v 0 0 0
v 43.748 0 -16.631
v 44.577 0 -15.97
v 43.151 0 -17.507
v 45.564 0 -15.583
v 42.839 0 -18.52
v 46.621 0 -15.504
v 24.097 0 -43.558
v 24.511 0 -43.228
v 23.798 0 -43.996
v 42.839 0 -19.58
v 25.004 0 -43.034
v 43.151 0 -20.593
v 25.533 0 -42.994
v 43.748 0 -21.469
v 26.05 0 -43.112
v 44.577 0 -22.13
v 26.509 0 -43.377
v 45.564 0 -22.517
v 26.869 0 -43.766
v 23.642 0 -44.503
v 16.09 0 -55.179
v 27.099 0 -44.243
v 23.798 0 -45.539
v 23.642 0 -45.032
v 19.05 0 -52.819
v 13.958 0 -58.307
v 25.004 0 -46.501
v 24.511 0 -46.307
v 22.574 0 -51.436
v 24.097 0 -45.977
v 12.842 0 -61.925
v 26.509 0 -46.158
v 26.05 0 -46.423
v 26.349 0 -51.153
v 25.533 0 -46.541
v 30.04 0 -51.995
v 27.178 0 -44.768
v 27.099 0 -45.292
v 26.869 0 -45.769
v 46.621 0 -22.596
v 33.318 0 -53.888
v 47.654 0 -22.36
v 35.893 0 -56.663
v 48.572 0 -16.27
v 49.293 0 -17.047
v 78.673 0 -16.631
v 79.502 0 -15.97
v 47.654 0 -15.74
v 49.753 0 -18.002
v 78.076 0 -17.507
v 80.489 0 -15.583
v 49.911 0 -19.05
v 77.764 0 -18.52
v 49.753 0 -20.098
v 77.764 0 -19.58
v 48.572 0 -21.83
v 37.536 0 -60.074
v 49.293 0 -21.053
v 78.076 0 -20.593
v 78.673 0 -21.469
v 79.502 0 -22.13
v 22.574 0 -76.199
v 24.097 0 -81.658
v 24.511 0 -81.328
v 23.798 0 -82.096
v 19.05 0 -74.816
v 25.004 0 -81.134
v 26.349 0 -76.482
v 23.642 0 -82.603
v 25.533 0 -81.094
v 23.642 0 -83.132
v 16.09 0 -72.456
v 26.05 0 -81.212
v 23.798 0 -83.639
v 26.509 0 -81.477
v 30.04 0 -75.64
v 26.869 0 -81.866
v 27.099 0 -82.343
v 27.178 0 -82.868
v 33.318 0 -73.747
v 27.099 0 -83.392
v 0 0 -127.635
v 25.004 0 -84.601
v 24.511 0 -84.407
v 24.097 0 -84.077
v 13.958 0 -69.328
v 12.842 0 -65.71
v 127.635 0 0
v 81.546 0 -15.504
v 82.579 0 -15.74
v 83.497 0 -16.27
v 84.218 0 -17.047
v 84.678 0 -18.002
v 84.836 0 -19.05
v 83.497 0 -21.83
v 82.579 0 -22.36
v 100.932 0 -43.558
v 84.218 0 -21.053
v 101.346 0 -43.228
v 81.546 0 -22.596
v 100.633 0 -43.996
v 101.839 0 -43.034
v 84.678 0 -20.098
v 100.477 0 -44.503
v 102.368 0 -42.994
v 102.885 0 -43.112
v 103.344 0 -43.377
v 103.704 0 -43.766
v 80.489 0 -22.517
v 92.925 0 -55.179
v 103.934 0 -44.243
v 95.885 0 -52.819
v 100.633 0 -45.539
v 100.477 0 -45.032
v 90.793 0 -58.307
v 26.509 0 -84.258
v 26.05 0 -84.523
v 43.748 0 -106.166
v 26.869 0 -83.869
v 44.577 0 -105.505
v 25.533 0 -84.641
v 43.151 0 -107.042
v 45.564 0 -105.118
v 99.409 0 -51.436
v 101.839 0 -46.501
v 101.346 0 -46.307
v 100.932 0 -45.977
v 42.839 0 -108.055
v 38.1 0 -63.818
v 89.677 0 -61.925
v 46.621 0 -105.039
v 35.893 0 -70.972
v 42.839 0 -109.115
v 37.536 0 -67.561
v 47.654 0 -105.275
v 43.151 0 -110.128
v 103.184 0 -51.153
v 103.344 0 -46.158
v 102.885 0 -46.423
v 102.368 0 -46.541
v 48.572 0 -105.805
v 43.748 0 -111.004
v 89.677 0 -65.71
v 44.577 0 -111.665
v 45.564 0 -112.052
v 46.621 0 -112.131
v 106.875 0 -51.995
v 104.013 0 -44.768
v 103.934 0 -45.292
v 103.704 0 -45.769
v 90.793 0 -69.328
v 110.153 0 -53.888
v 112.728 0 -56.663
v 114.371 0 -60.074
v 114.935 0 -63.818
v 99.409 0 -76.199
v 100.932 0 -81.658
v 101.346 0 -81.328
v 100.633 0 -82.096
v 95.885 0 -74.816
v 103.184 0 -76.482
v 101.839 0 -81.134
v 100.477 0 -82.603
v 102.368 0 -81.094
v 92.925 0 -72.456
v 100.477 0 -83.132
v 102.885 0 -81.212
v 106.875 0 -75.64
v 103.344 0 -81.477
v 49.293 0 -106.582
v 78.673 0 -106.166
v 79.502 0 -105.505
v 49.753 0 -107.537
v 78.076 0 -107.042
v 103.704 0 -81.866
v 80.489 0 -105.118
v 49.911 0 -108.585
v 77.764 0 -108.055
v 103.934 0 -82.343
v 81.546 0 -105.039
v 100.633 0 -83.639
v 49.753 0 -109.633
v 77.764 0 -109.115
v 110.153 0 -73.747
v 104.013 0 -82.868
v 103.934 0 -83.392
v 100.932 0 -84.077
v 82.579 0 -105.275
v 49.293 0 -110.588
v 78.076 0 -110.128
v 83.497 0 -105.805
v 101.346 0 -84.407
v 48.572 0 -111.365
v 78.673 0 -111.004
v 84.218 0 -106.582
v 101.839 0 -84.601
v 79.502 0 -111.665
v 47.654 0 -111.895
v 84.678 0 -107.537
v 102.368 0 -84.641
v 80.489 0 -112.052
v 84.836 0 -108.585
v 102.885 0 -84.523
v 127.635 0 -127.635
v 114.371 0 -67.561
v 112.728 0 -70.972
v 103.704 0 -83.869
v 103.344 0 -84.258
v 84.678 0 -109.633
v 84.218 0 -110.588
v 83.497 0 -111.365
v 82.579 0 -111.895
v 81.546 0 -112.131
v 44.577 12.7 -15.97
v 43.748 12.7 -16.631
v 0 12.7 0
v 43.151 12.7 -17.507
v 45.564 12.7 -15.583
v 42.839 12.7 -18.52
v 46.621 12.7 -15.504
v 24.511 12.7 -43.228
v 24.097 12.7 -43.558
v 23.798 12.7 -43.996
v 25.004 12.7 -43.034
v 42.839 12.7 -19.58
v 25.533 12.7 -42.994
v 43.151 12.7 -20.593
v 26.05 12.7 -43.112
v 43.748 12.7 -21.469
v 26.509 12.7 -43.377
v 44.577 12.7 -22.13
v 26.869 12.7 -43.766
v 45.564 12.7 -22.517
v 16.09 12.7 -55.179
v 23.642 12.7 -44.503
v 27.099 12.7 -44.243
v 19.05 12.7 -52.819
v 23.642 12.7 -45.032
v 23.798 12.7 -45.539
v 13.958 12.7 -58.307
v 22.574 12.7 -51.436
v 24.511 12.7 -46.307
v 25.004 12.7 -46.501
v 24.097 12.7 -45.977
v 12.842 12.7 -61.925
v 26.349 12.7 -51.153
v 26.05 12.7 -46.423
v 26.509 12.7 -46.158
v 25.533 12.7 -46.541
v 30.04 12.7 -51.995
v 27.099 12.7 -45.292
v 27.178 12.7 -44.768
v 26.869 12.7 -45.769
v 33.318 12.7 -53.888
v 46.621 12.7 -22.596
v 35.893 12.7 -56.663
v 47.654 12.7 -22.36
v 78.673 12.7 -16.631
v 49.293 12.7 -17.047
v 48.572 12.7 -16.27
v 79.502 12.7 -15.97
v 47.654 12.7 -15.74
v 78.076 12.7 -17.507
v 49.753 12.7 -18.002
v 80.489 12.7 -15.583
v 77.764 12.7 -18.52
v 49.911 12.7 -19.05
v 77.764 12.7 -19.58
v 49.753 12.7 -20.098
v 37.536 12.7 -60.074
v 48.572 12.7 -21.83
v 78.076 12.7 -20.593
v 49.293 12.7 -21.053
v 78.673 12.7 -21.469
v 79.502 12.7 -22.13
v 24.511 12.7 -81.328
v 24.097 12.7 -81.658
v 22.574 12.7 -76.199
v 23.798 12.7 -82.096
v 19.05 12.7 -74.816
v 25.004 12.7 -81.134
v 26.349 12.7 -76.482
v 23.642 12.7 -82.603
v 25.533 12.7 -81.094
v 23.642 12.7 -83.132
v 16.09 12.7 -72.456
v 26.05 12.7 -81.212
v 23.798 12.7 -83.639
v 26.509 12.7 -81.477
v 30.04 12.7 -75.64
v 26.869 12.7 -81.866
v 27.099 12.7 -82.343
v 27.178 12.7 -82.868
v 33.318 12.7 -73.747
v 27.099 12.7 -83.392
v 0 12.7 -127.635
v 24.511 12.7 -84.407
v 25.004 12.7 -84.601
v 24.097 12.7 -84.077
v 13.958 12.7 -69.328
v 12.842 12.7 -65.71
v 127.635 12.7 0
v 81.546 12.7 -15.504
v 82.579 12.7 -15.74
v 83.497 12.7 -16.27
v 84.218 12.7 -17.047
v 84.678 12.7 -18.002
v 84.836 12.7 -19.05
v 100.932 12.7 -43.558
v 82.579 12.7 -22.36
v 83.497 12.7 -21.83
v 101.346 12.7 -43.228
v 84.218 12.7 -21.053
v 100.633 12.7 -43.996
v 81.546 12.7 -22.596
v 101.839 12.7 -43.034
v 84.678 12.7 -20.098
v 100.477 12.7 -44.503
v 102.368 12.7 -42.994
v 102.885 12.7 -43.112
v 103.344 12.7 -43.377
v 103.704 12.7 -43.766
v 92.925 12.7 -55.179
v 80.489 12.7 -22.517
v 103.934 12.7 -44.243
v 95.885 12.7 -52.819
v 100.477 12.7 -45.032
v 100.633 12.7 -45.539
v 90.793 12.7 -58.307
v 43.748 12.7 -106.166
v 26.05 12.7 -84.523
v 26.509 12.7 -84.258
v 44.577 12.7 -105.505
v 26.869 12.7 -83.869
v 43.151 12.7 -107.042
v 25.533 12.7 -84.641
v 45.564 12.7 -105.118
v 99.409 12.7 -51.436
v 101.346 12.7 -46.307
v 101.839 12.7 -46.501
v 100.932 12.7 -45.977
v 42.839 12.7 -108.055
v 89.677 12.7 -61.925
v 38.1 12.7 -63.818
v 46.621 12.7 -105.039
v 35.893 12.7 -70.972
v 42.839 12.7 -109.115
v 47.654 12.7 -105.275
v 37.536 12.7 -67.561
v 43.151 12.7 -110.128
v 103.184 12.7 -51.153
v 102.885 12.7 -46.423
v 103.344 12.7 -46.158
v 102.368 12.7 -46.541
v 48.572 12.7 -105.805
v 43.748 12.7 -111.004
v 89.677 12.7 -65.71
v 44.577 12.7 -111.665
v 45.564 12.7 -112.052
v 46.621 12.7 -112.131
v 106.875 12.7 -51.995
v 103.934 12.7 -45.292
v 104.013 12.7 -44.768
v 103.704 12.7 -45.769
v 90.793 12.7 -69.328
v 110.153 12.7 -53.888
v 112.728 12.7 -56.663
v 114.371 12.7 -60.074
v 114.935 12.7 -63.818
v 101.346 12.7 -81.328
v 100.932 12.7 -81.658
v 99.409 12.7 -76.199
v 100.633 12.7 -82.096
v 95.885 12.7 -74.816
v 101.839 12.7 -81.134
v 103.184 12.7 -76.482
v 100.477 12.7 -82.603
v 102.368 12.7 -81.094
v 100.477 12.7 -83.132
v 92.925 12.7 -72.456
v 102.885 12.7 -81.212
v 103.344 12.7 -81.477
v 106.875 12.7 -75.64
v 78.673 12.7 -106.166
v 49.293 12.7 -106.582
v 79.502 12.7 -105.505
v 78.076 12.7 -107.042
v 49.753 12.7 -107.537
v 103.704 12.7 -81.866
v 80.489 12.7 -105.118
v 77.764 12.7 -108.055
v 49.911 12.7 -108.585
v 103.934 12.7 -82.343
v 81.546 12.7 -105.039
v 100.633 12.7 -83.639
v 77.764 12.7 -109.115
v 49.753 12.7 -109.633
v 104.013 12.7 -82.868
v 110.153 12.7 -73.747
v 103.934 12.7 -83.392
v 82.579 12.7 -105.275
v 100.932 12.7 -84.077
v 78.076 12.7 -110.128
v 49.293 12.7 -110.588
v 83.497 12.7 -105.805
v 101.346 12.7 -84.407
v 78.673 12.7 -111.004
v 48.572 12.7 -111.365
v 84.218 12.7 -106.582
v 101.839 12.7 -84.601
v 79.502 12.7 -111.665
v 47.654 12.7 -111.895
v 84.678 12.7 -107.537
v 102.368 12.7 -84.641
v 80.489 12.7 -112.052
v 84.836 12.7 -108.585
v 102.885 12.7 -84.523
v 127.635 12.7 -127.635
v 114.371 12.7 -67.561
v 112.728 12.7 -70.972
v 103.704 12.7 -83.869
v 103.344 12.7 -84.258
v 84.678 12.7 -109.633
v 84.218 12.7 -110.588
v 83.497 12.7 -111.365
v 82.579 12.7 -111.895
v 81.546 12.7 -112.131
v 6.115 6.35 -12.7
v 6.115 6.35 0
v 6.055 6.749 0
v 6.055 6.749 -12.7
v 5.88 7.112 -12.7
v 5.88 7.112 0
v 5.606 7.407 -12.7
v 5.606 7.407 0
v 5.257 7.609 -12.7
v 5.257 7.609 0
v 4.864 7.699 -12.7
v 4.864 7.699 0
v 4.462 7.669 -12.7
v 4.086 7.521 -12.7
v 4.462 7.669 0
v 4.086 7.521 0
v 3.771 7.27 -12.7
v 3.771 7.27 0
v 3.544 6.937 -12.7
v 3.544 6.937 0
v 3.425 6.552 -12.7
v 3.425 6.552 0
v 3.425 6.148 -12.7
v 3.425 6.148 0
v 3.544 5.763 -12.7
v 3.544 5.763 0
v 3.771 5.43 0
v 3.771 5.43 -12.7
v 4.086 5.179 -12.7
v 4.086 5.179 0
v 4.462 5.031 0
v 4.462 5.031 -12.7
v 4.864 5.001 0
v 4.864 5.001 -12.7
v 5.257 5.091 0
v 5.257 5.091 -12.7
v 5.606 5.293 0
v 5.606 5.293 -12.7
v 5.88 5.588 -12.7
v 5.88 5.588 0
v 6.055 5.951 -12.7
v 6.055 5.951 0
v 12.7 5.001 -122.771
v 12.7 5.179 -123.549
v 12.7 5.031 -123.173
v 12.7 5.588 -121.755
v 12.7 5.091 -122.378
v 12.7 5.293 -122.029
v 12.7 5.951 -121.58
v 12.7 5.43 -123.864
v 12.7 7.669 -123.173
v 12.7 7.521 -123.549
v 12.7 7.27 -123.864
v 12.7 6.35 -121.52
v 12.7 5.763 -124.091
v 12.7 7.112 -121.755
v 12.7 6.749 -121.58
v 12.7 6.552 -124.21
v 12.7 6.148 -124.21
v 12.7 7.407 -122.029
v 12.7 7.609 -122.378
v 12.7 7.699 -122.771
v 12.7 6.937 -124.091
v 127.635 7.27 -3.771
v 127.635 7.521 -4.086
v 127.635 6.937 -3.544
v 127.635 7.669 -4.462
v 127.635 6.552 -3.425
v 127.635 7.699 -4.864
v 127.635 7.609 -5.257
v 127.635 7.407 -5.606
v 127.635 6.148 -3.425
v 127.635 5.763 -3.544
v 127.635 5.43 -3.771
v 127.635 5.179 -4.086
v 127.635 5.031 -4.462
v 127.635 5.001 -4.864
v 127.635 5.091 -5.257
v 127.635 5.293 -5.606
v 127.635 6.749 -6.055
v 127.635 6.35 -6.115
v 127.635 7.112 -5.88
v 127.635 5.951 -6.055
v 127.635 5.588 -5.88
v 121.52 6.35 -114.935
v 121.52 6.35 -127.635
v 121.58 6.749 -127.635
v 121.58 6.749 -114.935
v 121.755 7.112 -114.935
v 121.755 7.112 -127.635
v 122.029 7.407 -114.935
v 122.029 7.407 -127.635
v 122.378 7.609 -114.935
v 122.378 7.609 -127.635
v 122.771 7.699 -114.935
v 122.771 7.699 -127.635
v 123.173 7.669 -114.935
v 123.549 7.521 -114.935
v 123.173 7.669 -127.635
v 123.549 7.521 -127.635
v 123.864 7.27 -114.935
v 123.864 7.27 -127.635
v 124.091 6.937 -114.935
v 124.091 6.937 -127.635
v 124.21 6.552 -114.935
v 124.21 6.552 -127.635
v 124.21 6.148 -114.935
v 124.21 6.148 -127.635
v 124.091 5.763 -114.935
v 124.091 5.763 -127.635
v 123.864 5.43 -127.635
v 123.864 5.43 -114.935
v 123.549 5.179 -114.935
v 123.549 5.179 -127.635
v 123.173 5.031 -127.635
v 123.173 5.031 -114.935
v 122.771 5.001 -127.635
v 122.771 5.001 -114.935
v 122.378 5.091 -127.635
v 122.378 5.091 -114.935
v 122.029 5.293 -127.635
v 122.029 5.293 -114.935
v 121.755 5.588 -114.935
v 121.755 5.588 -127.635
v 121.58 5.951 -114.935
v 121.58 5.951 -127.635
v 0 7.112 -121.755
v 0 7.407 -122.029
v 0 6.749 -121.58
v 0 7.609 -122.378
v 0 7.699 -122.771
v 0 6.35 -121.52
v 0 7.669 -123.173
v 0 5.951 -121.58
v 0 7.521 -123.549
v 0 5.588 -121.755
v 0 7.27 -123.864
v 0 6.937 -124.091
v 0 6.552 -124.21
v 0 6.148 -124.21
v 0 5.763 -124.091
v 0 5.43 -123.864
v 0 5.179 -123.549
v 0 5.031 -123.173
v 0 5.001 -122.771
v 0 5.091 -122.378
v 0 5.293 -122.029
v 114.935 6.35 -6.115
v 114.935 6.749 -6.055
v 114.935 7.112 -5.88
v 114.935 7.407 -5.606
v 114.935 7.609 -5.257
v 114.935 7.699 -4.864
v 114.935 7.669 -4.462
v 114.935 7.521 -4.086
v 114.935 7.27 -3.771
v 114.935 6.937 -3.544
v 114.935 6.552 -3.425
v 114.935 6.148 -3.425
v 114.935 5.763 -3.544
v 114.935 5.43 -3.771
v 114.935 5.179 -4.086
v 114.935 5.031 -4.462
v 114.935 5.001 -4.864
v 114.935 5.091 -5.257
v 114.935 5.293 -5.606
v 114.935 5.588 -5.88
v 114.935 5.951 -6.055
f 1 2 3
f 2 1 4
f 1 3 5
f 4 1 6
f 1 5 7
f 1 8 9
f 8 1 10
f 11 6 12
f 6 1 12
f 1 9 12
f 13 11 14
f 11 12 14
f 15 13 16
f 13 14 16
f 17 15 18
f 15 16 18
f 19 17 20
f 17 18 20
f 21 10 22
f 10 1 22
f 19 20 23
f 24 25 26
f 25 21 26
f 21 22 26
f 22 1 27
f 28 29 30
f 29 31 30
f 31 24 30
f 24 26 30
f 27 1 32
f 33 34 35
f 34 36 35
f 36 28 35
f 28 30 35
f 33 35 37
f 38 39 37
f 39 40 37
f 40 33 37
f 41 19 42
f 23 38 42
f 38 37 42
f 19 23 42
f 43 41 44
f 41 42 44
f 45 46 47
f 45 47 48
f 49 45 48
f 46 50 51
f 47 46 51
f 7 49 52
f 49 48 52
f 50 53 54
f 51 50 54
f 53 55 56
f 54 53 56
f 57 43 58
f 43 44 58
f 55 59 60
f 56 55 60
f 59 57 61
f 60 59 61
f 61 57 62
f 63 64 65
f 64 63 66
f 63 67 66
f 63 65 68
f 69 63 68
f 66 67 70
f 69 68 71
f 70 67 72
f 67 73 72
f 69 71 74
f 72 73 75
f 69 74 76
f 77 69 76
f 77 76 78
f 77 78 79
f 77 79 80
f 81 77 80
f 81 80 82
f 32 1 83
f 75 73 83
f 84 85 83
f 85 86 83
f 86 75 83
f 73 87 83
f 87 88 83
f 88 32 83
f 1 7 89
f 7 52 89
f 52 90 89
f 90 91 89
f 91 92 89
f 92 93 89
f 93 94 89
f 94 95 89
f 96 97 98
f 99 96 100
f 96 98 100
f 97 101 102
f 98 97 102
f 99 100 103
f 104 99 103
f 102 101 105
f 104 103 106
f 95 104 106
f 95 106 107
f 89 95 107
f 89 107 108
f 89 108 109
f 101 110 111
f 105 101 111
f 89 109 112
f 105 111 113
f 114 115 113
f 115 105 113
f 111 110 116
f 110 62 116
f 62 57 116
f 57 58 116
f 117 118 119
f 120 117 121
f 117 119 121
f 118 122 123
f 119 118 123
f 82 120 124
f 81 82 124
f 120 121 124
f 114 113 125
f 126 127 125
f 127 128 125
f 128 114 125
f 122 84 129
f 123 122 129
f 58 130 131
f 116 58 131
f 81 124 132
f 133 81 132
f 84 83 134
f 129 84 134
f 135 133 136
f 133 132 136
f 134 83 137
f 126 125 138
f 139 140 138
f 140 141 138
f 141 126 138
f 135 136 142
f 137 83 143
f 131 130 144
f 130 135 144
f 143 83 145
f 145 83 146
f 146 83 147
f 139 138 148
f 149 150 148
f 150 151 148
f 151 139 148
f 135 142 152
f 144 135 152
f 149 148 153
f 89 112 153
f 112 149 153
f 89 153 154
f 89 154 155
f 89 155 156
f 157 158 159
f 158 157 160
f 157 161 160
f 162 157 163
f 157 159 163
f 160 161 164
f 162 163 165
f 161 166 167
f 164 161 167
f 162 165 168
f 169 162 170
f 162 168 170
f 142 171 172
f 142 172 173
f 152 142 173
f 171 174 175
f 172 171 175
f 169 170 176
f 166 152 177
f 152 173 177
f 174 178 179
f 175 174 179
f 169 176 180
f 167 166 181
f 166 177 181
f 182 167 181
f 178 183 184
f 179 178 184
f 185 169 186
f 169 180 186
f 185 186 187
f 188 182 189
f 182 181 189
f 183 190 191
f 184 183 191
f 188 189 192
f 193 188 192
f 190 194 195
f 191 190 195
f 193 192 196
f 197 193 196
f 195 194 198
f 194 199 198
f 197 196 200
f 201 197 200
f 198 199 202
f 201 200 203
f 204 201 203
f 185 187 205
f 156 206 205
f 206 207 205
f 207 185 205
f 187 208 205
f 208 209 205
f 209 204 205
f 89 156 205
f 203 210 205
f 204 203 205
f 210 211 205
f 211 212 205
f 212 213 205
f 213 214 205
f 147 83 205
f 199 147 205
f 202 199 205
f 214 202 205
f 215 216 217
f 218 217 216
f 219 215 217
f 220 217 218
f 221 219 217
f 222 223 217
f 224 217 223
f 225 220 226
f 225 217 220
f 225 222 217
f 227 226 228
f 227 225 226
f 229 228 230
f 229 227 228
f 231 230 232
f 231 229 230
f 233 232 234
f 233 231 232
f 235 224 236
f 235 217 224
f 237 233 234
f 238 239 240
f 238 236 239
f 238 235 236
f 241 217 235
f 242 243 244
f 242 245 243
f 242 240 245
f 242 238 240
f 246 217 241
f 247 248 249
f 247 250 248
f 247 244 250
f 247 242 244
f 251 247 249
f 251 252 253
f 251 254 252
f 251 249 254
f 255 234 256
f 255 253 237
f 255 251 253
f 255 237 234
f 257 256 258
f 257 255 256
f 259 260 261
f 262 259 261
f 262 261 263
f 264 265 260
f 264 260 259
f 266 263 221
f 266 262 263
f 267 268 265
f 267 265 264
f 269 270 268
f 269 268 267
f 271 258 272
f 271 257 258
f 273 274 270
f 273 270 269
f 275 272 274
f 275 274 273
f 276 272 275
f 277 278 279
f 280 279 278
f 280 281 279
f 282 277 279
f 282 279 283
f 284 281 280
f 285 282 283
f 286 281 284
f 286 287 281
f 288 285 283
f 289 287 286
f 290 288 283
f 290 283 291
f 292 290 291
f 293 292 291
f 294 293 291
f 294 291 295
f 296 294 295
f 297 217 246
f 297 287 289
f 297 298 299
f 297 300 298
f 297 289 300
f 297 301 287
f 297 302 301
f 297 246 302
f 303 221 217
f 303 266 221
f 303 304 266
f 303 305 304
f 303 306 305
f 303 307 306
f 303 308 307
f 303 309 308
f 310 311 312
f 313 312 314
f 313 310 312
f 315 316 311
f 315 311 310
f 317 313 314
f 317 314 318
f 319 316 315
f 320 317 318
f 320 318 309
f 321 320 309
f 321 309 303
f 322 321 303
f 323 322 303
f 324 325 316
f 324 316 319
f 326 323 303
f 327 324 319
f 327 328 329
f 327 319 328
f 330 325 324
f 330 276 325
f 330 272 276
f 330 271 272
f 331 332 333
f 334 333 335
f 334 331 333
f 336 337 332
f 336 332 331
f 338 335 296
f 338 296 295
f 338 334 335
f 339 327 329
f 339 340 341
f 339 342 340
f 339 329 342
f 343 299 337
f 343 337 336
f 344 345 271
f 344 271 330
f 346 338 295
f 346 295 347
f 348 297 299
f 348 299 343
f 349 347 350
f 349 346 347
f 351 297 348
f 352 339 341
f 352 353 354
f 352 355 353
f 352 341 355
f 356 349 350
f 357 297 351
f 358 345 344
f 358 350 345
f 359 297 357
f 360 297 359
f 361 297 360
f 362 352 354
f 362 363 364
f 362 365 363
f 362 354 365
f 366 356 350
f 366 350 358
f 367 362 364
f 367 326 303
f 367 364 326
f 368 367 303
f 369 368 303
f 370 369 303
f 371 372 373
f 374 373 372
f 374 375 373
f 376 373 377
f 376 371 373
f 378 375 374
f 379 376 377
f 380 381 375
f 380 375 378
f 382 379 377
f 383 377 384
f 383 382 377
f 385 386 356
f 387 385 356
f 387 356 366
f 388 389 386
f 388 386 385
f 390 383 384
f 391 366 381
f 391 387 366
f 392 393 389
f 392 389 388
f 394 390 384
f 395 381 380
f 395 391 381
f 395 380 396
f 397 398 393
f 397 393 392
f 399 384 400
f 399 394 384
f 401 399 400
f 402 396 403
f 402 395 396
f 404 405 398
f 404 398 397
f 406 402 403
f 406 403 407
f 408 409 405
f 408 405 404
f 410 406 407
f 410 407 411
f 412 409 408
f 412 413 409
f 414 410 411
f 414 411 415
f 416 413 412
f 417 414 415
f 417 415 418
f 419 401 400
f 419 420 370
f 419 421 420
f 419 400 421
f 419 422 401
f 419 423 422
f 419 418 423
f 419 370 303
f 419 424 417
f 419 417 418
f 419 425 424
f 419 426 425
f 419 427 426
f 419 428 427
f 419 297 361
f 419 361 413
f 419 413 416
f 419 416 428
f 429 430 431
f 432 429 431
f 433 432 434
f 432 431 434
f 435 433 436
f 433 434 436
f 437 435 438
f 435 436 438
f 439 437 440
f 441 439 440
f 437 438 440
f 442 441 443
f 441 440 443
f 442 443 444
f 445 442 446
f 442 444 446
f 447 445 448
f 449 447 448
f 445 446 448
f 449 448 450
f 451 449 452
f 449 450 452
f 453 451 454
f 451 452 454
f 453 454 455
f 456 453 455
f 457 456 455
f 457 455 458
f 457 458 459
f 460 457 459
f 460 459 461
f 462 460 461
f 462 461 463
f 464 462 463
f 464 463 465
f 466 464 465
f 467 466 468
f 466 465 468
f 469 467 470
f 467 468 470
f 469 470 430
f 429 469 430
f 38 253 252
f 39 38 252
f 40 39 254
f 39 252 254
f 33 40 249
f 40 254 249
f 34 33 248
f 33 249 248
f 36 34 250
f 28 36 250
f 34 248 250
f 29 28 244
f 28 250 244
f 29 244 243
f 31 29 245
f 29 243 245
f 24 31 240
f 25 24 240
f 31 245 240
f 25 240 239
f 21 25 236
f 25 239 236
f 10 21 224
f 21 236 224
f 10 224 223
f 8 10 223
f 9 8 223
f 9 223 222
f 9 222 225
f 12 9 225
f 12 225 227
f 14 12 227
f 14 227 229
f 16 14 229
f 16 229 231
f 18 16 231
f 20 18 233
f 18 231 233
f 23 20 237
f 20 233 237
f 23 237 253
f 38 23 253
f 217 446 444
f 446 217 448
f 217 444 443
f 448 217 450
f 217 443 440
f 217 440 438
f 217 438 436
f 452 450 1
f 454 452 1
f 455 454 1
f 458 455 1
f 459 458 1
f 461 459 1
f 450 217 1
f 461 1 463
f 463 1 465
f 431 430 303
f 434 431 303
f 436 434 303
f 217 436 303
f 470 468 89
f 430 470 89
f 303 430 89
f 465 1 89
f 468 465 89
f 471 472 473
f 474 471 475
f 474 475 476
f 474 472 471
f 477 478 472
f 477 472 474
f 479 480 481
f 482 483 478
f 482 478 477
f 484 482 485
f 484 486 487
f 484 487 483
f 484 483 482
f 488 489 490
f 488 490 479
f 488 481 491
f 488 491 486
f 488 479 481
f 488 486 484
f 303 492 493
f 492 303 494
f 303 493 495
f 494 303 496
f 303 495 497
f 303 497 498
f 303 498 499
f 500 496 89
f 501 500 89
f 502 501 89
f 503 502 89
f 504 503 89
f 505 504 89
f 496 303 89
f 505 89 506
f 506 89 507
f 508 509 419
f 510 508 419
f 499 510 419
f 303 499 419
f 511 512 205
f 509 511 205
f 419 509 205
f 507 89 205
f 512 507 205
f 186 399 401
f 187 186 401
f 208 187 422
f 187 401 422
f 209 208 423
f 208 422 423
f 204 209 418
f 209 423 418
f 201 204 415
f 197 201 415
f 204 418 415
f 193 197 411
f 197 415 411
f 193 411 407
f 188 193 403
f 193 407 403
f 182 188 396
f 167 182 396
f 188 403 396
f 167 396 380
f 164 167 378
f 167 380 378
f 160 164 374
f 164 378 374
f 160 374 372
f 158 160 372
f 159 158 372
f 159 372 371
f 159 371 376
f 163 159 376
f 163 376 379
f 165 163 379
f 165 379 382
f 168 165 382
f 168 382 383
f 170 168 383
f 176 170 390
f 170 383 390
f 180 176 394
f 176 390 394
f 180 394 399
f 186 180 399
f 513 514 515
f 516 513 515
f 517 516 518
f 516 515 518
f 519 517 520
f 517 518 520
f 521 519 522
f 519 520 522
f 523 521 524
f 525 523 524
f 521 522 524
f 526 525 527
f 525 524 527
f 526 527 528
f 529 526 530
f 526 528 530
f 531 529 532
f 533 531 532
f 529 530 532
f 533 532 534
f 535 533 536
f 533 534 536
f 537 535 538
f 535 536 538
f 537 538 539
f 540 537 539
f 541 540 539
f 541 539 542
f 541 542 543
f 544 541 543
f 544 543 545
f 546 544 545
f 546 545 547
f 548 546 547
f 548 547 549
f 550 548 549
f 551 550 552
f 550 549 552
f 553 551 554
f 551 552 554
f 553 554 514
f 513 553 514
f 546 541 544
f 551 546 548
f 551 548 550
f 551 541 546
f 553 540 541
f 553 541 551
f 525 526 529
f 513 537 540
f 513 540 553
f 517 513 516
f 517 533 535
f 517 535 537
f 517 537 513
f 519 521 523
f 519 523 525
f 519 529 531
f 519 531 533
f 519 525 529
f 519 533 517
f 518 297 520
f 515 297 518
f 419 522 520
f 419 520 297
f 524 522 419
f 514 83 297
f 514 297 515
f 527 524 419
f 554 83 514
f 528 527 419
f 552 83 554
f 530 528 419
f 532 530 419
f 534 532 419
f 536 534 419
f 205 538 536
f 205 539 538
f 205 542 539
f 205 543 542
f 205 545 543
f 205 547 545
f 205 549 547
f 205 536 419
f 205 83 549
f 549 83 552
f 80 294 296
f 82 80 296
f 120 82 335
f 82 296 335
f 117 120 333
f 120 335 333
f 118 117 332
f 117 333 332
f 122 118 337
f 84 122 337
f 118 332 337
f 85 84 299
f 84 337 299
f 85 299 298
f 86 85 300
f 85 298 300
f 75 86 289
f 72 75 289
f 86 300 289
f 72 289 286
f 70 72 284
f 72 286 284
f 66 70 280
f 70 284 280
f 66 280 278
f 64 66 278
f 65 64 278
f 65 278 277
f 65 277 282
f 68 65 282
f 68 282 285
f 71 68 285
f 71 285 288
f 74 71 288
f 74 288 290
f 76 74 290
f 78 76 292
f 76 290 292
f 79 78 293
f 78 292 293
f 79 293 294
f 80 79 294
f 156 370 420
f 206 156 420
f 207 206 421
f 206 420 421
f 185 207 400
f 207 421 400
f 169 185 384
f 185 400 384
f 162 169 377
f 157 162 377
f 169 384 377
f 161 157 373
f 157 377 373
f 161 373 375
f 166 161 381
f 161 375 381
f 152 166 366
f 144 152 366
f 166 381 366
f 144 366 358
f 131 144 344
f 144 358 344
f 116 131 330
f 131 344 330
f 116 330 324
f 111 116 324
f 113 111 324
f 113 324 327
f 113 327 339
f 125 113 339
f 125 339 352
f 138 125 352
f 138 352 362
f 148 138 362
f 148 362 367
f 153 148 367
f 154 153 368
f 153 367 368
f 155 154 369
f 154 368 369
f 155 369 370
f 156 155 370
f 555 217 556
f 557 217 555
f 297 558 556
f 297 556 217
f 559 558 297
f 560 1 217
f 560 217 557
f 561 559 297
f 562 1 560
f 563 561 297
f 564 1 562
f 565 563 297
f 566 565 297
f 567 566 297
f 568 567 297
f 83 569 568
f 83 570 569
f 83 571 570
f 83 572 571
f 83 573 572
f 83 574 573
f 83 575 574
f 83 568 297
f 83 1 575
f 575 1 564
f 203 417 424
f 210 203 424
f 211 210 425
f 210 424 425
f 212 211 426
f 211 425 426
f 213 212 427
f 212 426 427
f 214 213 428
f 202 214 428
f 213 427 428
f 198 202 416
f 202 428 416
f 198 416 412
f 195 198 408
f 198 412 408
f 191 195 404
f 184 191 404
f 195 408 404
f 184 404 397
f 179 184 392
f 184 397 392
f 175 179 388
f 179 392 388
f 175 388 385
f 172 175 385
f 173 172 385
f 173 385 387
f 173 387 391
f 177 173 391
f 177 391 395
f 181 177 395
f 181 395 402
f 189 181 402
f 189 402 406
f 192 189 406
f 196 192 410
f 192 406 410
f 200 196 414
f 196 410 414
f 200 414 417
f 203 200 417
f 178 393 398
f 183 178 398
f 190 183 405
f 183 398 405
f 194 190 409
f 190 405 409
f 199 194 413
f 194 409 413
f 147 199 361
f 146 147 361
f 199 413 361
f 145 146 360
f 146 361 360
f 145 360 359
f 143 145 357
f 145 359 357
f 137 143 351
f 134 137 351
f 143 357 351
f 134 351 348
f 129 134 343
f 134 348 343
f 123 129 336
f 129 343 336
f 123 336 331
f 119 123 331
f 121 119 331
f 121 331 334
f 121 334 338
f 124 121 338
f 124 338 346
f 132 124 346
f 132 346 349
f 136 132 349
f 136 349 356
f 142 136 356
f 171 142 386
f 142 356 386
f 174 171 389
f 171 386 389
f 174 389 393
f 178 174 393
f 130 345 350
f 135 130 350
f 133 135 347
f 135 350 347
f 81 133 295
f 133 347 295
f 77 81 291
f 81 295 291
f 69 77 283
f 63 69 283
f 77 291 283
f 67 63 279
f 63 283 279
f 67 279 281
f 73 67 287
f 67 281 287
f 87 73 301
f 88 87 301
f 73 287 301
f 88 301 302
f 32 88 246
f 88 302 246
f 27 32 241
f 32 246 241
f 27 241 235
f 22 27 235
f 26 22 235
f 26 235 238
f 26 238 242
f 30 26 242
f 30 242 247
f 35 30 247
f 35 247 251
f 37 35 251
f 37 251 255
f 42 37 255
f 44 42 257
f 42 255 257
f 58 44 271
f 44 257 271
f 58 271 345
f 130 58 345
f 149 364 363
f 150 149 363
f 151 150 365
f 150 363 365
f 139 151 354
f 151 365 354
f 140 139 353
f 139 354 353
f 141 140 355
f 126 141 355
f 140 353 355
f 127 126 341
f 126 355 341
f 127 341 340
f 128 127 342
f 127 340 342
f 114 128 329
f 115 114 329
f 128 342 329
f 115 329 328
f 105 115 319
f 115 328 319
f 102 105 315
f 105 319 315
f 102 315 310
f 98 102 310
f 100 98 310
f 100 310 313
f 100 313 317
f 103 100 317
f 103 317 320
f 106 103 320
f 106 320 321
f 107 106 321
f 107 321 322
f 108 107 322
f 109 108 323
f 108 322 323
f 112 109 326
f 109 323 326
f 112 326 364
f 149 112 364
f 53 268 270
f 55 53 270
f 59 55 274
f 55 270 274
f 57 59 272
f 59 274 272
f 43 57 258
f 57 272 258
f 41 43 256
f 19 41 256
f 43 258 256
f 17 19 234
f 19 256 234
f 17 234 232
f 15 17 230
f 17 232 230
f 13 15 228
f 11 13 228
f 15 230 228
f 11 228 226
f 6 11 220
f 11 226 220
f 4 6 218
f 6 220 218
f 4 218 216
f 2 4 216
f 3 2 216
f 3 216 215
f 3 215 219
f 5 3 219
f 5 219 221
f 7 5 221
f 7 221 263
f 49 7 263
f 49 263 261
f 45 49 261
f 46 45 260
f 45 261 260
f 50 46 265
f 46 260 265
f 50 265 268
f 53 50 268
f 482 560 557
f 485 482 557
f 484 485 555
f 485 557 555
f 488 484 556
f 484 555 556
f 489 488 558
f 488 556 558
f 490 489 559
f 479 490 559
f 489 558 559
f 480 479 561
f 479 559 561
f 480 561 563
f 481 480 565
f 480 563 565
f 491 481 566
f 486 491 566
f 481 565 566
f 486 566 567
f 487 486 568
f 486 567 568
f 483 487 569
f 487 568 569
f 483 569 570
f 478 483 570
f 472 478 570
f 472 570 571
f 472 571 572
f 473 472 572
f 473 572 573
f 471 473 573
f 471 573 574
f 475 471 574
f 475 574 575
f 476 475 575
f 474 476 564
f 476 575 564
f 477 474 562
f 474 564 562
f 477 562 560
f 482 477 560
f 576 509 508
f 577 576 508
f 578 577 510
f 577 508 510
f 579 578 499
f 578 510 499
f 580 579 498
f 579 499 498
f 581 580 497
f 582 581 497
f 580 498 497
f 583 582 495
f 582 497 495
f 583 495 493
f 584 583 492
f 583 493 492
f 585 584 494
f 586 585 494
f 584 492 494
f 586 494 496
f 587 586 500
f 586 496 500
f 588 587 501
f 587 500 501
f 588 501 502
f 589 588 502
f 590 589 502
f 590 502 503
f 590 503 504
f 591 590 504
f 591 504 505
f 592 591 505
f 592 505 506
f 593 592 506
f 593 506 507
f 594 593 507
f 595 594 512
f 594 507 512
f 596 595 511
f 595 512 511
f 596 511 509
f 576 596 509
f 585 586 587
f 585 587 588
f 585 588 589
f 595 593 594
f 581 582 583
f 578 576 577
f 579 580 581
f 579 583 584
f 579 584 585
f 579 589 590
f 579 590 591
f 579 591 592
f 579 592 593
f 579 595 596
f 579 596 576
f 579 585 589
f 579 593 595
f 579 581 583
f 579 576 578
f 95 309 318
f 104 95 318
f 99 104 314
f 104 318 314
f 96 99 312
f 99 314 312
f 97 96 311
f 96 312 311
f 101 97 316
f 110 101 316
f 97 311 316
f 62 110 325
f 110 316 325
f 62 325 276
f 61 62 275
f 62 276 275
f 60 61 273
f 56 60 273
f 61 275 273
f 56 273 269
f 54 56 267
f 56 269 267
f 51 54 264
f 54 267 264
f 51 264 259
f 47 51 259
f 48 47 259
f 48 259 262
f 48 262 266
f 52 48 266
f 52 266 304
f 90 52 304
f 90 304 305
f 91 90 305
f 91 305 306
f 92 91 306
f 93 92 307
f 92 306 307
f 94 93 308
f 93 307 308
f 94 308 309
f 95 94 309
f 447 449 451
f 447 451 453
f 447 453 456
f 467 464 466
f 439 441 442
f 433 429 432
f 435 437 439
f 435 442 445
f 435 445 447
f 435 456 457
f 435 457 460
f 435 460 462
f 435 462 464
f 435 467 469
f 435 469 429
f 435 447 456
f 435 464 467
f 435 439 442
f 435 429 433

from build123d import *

# Parameters (mm, degrees)
SKETCH1_W                      = 127.635
SKETCH1_H                      = 127.635
MAIN_PLATE_DEPTH               = 12.7
SKETCH2_R                      = 3.556
U_BOLT_HOLE_DEPTH              = 12.7
U_BOLT_PATTERN_COUNT           = 2
U_BOLT_PATTERN_PITCH           = 34.925
U_BOLT_PATTERN_COUNT_DIR2      = 2
U_BOLT_PATTERN_PITCH_DIR2      = 89.535
SKETCH3_R                      = 1.778
RAPTOR_BOLT_HOLE_DEPTH         = 12.7
RAPTOR_BOLT_PATTERN_COUNT      = 2
RAPTOR_BOLT_PATTERN_PITCH      = 38.1
RAPTOR_BOLT_PATTERN_COUNT_DIR2 = 2
RAPTOR_BOLT_PATTERN_PITCH_DIR2 = 76.835
SKETCH4_R                      = 12.7
CO2_CYLINDER_HOLE_DEPTH        = 12.7
CO2_PATTERN_COUNT              = 2
CO2_PATTERN_PITCH              = 76.835
SKETCH5_R                      = 1.35255
FRAME_ATTACHMENT_HOLE_1_DEPTH  = 12.7
SKETCH6_R                      = 1.35255
FRAME_ATTACHMENT_HOLE_2_DEPTH  = 12.7
SKETCH7_R                      = 1.35255
FRAME_ATTACHMENT_HOLE_3_DEPTH  = 12.7
SKETCH8_R                      = 1.35255
FRAME_ATTACHMENT_HOLE_4_DEPTH  = 12.7


with BuildPart() as part:
    # Sketch1 → Main Plate (new body)
    with BuildSketch(Plane(origin=(0, 0, 0), x_dir=(1, 0, 0), z_dir=(0, 1, 0))):
        with Locations((63.8175, 63.8175)):
            Rectangle(SKETCH1_W, SKETCH1_H)
    extrude(amount=MAIN_PLATE_DEPTH)

    # Sketch2 → U-Bolt Hole (cut)
    with BuildSketch(Plane(origin=(0, 12.7, 0), x_dir=(1, 0, 0), z_dir=(0, 1, 0))):
        with Locations((46.355, 108.585)):
            Circle(SKETCH2_R)
    u_bolt_hole = extrude(amount=-U_BOLT_HOLE_DEPTH, mode=Mode.SUBTRACT)

    # U-Bolt Pattern: U-Bolt Hole 2 × 2
    with Locations(*[(i * U_BOLT_PATTERN_PITCH, 0, j * U_BOLT_PATTERN_PITCH_DIR2) for i in range(U_BOLT_PATTERN_COUNT) for j in range(U_BOLT_PATTERN_COUNT_DIR2) if (i, j) != (0, 0)]):
        add(u_bolt_hole, mode=Mode.SUBTRACT)

    # Sketch3 → Raptor Bolt Hole (cut)
    with BuildSketch(Plane(origin=(0, 12.7, 0), x_dir=(1, 0, 0), z_dir=(0, 1, 0))):
        with Locations((25.4, 44.7675)):
            Circle(SKETCH3_R)
    raptor_bolt_hole = extrude(amount=-RAPTOR_BOLT_HOLE_DEPTH, mode=Mode.SUBTRACT)

    # Raptor Bolt Pattern: Raptor Bolt Hole 2 × 2
    with Locations(*[(j * RAPTOR_BOLT_PATTERN_PITCH_DIR2, 0, -i * RAPTOR_BOLT_PATTERN_PITCH) for i in range(RAPTOR_BOLT_PATTERN_COUNT) for j in range(RAPTOR_BOLT_PATTERN_COUNT_DIR2) if (i, j) != (0, 0)]):
        add(raptor_bolt_hole, mode=Mode.SUBTRACT)

    # Sketch4 → Co2 Cylinder Hole (cut)
    with BuildSketch(Plane(origin=(0, 12.7, 0), x_dir=(1, 0, 0), z_dir=(0, 1, 0))):
        with Locations((25.4, 63.8175)):
            Circle(SKETCH4_R)
    co2_cylinder_hole = extrude(amount=-CO2_CYLINDER_HOLE_DEPTH, mode=Mode.SUBTRACT)

    # Co2 Pattern: Co2 Cylinder Hole ×2
    with Locations(*[(i * CO2_PATTERN_PITCH, 0, 0) for i in range(1, CO2_PATTERN_COUNT)]):
        add(co2_cylinder_hole, mode=Mode.SUBTRACT)

    # Sketch5 → Frame attachment hole 1 (cut)
    with BuildSketch(Plane.XY):
        with Locations((4.7625, 6.35)):
            Circle(SKETCH5_R)
    extrude(amount=-FRAME_ATTACHMENT_HOLE_1_DEPTH, mode=Mode.SUBTRACT)

    # Sketch6 → Frame attachment hole 2 (cut)
    with BuildSketch(Plane.ZY):
        with Locations((-122.8725, 6.35)):
            Circle(SKETCH6_R)
    extrude(amount=-FRAME_ATTACHMENT_HOLE_2_DEPTH, mode=Mode.SUBTRACT)

    # Sketch7 → Frame attachment hole 3 (cut)
    with BuildSketch(Plane(origin=(0, 0, -127.635), x_dir=(-1, 0, 0), z_dir=(0, 0, -1))):
        with Locations((-122.8725, 6.35)):
            Circle(SKETCH7_R)
    extrude(amount=-FRAME_ATTACHMENT_HOLE_3_DEPTH, mode=Mode.SUBTRACT)

    # Sketch8 → Frame attachment hole 4 (cut)
    with BuildSketch(Plane(origin=(127.635, 0, 0), x_dir=(0, 0, -1), z_dir=(1, 0, 0))):
        with Locations((4.7625, 6.35)):
            Circle(SKETCH8_R)
    extrude(amount=-FRAME_ATTACHMENT_HOLE_4_DEPTH, mode=Mode.SUBTRACT)


solid = part.part
